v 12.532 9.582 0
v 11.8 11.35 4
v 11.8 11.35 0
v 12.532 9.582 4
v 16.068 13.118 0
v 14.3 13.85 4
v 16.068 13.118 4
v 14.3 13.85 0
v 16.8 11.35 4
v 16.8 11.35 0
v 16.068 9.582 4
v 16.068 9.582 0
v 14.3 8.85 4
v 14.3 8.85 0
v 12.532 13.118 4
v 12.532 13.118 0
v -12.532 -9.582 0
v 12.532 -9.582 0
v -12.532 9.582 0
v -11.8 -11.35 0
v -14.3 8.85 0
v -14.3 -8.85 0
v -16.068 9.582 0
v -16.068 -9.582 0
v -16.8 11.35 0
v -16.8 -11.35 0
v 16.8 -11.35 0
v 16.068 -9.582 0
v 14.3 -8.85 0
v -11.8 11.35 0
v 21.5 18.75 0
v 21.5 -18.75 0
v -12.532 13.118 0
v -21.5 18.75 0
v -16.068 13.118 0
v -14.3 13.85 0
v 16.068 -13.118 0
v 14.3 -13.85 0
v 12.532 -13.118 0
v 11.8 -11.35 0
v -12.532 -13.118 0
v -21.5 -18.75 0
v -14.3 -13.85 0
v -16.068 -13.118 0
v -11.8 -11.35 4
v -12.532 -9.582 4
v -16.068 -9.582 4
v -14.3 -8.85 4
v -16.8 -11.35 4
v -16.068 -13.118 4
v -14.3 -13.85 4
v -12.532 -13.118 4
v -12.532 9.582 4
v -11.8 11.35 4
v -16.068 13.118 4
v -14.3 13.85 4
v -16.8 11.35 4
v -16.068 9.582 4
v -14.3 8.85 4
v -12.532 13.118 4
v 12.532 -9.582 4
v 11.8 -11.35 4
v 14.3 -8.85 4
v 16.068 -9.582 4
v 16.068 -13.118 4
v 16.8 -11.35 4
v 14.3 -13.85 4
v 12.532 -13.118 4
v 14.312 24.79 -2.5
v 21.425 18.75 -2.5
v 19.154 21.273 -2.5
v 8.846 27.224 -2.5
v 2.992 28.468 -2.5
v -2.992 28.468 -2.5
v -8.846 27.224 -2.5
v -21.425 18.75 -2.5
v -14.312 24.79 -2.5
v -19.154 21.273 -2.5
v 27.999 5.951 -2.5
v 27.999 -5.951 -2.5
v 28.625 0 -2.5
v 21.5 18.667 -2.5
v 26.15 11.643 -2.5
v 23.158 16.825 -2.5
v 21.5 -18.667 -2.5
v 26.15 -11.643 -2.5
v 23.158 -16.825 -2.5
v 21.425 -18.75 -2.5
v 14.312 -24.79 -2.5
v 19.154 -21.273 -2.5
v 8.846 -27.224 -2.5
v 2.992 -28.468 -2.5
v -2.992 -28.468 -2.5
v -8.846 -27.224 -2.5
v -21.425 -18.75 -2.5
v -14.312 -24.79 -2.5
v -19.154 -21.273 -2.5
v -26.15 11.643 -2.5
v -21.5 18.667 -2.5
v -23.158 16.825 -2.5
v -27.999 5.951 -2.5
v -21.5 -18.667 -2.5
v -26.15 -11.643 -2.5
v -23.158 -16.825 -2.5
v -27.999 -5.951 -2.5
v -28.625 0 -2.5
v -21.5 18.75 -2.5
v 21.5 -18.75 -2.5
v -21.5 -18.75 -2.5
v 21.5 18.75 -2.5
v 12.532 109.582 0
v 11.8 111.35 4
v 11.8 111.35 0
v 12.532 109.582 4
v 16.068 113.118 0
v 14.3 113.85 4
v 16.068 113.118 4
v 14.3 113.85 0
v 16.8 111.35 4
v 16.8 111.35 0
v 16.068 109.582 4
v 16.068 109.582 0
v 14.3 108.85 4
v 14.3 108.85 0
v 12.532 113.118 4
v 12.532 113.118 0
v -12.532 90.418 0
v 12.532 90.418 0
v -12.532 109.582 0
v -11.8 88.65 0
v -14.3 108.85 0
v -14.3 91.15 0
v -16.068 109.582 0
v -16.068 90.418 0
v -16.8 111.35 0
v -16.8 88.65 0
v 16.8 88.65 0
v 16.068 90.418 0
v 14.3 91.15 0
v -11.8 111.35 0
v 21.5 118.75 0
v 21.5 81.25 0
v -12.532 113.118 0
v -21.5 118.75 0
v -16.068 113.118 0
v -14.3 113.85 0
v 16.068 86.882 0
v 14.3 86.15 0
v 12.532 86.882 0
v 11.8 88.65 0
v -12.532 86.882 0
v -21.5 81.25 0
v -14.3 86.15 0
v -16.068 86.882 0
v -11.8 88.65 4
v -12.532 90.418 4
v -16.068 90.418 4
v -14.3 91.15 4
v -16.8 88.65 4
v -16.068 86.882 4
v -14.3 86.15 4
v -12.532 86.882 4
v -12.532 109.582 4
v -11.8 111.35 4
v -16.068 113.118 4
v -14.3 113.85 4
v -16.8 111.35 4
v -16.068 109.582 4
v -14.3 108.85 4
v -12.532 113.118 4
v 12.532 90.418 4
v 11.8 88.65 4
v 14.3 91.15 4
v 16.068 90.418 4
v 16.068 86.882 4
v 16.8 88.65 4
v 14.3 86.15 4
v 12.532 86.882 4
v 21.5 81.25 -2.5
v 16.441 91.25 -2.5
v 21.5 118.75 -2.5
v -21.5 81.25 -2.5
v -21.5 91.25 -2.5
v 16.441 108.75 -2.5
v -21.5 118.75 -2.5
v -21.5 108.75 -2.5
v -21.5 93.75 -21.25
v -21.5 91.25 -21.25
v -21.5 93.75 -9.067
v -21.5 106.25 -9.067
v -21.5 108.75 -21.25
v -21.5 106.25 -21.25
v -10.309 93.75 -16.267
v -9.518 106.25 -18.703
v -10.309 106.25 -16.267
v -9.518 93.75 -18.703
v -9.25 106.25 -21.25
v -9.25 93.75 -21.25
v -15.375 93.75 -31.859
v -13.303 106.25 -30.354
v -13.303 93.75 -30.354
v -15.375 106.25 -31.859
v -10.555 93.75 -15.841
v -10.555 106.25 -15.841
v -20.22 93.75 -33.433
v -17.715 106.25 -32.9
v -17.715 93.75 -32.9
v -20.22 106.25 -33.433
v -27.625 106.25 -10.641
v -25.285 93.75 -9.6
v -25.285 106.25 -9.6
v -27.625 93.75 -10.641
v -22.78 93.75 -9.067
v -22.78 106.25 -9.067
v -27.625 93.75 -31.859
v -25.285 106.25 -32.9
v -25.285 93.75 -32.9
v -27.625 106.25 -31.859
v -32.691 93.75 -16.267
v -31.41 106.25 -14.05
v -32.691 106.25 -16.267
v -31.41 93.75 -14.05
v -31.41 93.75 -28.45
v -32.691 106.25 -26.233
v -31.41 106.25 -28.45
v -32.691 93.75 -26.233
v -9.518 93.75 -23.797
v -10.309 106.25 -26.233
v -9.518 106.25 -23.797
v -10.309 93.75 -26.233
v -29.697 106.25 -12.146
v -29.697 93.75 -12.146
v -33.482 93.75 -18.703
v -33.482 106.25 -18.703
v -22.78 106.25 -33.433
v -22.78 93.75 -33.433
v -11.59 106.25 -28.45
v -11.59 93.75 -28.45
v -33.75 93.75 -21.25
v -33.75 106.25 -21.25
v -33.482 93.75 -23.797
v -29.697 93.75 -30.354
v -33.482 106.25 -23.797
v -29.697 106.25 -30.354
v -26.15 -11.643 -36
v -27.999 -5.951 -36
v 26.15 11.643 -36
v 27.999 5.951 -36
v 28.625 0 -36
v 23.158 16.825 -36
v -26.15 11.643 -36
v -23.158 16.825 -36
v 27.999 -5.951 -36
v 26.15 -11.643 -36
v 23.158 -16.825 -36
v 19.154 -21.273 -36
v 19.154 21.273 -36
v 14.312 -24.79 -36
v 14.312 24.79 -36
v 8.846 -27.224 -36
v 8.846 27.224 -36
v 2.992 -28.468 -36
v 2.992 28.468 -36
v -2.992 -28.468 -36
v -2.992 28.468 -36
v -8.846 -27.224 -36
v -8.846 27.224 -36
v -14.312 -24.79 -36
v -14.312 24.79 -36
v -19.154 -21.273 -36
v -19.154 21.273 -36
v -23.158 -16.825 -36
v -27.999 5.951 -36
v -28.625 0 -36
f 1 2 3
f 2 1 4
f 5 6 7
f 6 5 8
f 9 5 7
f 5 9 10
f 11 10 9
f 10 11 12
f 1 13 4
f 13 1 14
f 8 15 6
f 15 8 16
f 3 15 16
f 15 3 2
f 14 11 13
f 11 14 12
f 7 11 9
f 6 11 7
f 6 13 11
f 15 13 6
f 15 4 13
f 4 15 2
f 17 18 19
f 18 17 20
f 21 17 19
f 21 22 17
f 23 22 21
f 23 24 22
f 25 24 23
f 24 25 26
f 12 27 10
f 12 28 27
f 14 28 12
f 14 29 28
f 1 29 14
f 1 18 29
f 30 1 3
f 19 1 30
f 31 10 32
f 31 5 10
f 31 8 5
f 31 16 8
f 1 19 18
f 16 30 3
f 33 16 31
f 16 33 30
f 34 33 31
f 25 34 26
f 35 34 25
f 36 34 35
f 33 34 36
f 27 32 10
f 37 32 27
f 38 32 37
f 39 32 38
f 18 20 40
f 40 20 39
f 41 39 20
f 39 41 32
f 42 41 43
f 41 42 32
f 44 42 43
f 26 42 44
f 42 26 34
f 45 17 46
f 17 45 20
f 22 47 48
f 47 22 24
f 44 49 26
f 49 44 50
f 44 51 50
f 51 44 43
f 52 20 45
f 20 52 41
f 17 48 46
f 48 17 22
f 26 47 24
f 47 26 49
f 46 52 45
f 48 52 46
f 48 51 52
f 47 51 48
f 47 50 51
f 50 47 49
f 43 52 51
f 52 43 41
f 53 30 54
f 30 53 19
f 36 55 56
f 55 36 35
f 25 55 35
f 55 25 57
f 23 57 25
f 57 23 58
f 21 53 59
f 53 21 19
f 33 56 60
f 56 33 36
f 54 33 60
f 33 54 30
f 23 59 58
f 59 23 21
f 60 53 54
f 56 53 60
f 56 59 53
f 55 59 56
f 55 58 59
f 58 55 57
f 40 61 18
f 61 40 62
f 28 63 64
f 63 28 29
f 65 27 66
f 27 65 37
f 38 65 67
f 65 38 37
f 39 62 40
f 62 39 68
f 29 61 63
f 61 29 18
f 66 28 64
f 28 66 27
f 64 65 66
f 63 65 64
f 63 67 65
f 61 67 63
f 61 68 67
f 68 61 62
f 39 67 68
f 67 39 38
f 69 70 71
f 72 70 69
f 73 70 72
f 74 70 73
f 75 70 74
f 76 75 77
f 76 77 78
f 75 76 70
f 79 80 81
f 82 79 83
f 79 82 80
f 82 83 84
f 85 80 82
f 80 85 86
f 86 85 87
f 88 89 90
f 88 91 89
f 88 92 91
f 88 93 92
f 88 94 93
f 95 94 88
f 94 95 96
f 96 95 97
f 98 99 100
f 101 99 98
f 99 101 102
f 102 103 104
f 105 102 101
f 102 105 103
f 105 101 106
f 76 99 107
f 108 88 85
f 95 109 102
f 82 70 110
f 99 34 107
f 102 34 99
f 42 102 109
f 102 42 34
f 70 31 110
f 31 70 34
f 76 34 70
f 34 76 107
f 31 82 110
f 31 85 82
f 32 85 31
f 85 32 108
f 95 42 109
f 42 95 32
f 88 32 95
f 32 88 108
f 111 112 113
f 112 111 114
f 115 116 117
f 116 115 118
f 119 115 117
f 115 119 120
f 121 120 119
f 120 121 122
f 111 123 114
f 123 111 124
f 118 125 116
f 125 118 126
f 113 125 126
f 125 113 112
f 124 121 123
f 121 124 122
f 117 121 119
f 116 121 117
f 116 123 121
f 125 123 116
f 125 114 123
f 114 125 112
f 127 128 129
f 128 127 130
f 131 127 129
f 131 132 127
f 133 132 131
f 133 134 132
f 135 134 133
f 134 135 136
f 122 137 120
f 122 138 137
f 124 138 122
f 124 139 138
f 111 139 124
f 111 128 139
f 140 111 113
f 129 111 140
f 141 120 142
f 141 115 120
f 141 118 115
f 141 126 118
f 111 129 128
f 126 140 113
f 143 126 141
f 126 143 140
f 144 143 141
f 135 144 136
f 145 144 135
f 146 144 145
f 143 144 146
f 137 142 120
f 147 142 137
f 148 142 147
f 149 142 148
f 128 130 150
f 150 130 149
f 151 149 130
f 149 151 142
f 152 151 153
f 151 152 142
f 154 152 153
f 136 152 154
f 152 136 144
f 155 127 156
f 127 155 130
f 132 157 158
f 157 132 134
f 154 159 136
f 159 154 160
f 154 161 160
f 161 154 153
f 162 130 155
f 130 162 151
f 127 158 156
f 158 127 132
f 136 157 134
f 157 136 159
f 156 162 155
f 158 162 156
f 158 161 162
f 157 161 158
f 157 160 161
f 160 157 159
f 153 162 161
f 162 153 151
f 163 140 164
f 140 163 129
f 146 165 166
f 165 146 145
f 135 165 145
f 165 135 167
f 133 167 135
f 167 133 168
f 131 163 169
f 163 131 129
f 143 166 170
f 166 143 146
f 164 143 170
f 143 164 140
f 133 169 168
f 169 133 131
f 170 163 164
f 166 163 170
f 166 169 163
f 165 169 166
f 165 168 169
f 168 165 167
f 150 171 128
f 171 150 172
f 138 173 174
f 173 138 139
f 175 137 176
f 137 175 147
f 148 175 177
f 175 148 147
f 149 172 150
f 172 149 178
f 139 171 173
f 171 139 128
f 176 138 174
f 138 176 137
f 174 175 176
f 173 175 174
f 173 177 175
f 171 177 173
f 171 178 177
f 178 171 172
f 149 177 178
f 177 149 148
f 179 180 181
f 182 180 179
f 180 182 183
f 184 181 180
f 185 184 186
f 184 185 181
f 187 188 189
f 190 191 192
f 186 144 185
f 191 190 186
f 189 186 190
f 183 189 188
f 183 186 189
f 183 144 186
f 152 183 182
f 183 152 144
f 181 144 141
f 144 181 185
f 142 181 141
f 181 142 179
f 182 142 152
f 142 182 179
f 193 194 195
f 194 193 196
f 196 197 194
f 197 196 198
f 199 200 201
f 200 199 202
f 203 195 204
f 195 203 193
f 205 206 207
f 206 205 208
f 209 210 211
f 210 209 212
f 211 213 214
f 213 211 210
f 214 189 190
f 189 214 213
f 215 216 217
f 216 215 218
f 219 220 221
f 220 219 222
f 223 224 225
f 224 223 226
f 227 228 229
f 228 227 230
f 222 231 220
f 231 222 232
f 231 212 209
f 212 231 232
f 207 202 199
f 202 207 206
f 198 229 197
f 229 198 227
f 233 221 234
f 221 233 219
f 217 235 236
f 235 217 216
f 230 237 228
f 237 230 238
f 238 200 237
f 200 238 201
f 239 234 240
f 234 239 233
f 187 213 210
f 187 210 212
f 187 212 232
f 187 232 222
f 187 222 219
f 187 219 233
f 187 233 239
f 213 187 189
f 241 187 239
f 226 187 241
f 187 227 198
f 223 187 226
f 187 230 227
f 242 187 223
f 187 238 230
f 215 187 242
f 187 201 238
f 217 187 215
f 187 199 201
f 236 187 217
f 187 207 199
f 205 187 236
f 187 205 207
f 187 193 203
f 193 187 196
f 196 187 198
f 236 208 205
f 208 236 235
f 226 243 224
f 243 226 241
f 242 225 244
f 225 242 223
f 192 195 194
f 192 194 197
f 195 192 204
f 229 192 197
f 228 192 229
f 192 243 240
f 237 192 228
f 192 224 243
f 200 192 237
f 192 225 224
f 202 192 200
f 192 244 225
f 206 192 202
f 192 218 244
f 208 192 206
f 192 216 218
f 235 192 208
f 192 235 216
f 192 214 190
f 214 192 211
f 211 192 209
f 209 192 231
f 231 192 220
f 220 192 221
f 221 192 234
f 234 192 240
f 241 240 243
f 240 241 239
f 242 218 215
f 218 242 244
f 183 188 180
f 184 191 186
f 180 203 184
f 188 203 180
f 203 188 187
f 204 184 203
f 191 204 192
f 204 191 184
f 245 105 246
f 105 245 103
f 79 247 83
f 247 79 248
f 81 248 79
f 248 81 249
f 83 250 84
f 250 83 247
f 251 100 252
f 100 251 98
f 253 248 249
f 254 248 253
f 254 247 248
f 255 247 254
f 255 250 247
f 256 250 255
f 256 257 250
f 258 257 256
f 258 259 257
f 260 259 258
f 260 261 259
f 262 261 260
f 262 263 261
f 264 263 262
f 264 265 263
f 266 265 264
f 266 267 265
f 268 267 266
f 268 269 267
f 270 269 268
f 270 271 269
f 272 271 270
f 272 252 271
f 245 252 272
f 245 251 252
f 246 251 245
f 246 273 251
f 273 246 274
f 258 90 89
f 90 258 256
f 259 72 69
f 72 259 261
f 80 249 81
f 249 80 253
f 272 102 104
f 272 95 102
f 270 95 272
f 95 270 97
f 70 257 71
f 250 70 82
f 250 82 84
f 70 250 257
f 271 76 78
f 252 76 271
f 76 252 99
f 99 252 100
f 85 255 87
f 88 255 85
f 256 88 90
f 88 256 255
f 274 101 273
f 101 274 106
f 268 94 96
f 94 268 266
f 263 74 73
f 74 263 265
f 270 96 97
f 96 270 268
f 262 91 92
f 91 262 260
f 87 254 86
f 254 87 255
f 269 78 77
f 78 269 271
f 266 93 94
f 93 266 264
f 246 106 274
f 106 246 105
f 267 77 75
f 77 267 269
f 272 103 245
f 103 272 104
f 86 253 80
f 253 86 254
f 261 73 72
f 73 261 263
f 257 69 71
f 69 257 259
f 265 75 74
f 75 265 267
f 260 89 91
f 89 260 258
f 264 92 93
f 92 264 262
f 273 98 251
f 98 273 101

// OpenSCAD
wheelMountSizeX=43;
wheelMountSizeY=37.5;
wheelMountThickness=2.5;
holeDiameter = 5;
holeOffsetX  = 12.3 + 2;
holeOffsetY  = 9.35 + 2;

boltProtrusion = 4;

wheelDiameter  = 24.5;
wheelThickness = 12.5;

overallHeight  = 33.5;

translate([0,100,0])
front_wheel();
front_wheel_well();

// The size calc here sucks! Should do this with a rotate extrude
module front_wheel_well() {
  front_wheel_mount();
  color("silver")
  translate([0,0,-overallHeight-wheelMountThickness])
  cylinder(h=overallHeight, r=(wheelMountSizeX + wheelDiameter/2)/2 + 1);
  //echo((wheelMountSizeX + wheelDiameter/2)/2 + 1);
}

module front_wheel() {
  front_wheel_mount();

  color("DodgerBlue")
  translate([-wheelMountSizeX/2,wheelThickness/2,-overallHeight+wheelDiameter/2])
  rotate([90,0,0])
  cylinder(h=wheelThickness, r=wheelDiameter/2);
 
  color("silver")
  translate([0,-wheelThickness/2 - 5/2,0])
  rotate([-90,0,0])
  linear_extrude(wheelThickness + 5)
  polygon(points=[
    [-wheelMountSizeX/2,0],
    [-wheelMountSizeX/2,overallHeight-wheelDiameter/2],
    [wheelMountSizeX/2,0]
  ]);

}

module front_wheel_mount() {
  translate([0,0,-wheelMountThickness]) {
    color("silver")
    linear_extrude(height = wheelMountThickness)
    square([wheelMountSizeX, wheelMountSizeY], center=true);

    color("silver",.4)
    for (m = [0:1]) {
      mirror([m,0,0])
      for (a = [0:180:180]) {
        rotate([0,0,a])
        translate([holeOffsetX,holeOffsetY,wheelMountThickness])
        cylinder(h=boltProtrusion,r=holeDiameter/2);
      }
    }
  }  
}
